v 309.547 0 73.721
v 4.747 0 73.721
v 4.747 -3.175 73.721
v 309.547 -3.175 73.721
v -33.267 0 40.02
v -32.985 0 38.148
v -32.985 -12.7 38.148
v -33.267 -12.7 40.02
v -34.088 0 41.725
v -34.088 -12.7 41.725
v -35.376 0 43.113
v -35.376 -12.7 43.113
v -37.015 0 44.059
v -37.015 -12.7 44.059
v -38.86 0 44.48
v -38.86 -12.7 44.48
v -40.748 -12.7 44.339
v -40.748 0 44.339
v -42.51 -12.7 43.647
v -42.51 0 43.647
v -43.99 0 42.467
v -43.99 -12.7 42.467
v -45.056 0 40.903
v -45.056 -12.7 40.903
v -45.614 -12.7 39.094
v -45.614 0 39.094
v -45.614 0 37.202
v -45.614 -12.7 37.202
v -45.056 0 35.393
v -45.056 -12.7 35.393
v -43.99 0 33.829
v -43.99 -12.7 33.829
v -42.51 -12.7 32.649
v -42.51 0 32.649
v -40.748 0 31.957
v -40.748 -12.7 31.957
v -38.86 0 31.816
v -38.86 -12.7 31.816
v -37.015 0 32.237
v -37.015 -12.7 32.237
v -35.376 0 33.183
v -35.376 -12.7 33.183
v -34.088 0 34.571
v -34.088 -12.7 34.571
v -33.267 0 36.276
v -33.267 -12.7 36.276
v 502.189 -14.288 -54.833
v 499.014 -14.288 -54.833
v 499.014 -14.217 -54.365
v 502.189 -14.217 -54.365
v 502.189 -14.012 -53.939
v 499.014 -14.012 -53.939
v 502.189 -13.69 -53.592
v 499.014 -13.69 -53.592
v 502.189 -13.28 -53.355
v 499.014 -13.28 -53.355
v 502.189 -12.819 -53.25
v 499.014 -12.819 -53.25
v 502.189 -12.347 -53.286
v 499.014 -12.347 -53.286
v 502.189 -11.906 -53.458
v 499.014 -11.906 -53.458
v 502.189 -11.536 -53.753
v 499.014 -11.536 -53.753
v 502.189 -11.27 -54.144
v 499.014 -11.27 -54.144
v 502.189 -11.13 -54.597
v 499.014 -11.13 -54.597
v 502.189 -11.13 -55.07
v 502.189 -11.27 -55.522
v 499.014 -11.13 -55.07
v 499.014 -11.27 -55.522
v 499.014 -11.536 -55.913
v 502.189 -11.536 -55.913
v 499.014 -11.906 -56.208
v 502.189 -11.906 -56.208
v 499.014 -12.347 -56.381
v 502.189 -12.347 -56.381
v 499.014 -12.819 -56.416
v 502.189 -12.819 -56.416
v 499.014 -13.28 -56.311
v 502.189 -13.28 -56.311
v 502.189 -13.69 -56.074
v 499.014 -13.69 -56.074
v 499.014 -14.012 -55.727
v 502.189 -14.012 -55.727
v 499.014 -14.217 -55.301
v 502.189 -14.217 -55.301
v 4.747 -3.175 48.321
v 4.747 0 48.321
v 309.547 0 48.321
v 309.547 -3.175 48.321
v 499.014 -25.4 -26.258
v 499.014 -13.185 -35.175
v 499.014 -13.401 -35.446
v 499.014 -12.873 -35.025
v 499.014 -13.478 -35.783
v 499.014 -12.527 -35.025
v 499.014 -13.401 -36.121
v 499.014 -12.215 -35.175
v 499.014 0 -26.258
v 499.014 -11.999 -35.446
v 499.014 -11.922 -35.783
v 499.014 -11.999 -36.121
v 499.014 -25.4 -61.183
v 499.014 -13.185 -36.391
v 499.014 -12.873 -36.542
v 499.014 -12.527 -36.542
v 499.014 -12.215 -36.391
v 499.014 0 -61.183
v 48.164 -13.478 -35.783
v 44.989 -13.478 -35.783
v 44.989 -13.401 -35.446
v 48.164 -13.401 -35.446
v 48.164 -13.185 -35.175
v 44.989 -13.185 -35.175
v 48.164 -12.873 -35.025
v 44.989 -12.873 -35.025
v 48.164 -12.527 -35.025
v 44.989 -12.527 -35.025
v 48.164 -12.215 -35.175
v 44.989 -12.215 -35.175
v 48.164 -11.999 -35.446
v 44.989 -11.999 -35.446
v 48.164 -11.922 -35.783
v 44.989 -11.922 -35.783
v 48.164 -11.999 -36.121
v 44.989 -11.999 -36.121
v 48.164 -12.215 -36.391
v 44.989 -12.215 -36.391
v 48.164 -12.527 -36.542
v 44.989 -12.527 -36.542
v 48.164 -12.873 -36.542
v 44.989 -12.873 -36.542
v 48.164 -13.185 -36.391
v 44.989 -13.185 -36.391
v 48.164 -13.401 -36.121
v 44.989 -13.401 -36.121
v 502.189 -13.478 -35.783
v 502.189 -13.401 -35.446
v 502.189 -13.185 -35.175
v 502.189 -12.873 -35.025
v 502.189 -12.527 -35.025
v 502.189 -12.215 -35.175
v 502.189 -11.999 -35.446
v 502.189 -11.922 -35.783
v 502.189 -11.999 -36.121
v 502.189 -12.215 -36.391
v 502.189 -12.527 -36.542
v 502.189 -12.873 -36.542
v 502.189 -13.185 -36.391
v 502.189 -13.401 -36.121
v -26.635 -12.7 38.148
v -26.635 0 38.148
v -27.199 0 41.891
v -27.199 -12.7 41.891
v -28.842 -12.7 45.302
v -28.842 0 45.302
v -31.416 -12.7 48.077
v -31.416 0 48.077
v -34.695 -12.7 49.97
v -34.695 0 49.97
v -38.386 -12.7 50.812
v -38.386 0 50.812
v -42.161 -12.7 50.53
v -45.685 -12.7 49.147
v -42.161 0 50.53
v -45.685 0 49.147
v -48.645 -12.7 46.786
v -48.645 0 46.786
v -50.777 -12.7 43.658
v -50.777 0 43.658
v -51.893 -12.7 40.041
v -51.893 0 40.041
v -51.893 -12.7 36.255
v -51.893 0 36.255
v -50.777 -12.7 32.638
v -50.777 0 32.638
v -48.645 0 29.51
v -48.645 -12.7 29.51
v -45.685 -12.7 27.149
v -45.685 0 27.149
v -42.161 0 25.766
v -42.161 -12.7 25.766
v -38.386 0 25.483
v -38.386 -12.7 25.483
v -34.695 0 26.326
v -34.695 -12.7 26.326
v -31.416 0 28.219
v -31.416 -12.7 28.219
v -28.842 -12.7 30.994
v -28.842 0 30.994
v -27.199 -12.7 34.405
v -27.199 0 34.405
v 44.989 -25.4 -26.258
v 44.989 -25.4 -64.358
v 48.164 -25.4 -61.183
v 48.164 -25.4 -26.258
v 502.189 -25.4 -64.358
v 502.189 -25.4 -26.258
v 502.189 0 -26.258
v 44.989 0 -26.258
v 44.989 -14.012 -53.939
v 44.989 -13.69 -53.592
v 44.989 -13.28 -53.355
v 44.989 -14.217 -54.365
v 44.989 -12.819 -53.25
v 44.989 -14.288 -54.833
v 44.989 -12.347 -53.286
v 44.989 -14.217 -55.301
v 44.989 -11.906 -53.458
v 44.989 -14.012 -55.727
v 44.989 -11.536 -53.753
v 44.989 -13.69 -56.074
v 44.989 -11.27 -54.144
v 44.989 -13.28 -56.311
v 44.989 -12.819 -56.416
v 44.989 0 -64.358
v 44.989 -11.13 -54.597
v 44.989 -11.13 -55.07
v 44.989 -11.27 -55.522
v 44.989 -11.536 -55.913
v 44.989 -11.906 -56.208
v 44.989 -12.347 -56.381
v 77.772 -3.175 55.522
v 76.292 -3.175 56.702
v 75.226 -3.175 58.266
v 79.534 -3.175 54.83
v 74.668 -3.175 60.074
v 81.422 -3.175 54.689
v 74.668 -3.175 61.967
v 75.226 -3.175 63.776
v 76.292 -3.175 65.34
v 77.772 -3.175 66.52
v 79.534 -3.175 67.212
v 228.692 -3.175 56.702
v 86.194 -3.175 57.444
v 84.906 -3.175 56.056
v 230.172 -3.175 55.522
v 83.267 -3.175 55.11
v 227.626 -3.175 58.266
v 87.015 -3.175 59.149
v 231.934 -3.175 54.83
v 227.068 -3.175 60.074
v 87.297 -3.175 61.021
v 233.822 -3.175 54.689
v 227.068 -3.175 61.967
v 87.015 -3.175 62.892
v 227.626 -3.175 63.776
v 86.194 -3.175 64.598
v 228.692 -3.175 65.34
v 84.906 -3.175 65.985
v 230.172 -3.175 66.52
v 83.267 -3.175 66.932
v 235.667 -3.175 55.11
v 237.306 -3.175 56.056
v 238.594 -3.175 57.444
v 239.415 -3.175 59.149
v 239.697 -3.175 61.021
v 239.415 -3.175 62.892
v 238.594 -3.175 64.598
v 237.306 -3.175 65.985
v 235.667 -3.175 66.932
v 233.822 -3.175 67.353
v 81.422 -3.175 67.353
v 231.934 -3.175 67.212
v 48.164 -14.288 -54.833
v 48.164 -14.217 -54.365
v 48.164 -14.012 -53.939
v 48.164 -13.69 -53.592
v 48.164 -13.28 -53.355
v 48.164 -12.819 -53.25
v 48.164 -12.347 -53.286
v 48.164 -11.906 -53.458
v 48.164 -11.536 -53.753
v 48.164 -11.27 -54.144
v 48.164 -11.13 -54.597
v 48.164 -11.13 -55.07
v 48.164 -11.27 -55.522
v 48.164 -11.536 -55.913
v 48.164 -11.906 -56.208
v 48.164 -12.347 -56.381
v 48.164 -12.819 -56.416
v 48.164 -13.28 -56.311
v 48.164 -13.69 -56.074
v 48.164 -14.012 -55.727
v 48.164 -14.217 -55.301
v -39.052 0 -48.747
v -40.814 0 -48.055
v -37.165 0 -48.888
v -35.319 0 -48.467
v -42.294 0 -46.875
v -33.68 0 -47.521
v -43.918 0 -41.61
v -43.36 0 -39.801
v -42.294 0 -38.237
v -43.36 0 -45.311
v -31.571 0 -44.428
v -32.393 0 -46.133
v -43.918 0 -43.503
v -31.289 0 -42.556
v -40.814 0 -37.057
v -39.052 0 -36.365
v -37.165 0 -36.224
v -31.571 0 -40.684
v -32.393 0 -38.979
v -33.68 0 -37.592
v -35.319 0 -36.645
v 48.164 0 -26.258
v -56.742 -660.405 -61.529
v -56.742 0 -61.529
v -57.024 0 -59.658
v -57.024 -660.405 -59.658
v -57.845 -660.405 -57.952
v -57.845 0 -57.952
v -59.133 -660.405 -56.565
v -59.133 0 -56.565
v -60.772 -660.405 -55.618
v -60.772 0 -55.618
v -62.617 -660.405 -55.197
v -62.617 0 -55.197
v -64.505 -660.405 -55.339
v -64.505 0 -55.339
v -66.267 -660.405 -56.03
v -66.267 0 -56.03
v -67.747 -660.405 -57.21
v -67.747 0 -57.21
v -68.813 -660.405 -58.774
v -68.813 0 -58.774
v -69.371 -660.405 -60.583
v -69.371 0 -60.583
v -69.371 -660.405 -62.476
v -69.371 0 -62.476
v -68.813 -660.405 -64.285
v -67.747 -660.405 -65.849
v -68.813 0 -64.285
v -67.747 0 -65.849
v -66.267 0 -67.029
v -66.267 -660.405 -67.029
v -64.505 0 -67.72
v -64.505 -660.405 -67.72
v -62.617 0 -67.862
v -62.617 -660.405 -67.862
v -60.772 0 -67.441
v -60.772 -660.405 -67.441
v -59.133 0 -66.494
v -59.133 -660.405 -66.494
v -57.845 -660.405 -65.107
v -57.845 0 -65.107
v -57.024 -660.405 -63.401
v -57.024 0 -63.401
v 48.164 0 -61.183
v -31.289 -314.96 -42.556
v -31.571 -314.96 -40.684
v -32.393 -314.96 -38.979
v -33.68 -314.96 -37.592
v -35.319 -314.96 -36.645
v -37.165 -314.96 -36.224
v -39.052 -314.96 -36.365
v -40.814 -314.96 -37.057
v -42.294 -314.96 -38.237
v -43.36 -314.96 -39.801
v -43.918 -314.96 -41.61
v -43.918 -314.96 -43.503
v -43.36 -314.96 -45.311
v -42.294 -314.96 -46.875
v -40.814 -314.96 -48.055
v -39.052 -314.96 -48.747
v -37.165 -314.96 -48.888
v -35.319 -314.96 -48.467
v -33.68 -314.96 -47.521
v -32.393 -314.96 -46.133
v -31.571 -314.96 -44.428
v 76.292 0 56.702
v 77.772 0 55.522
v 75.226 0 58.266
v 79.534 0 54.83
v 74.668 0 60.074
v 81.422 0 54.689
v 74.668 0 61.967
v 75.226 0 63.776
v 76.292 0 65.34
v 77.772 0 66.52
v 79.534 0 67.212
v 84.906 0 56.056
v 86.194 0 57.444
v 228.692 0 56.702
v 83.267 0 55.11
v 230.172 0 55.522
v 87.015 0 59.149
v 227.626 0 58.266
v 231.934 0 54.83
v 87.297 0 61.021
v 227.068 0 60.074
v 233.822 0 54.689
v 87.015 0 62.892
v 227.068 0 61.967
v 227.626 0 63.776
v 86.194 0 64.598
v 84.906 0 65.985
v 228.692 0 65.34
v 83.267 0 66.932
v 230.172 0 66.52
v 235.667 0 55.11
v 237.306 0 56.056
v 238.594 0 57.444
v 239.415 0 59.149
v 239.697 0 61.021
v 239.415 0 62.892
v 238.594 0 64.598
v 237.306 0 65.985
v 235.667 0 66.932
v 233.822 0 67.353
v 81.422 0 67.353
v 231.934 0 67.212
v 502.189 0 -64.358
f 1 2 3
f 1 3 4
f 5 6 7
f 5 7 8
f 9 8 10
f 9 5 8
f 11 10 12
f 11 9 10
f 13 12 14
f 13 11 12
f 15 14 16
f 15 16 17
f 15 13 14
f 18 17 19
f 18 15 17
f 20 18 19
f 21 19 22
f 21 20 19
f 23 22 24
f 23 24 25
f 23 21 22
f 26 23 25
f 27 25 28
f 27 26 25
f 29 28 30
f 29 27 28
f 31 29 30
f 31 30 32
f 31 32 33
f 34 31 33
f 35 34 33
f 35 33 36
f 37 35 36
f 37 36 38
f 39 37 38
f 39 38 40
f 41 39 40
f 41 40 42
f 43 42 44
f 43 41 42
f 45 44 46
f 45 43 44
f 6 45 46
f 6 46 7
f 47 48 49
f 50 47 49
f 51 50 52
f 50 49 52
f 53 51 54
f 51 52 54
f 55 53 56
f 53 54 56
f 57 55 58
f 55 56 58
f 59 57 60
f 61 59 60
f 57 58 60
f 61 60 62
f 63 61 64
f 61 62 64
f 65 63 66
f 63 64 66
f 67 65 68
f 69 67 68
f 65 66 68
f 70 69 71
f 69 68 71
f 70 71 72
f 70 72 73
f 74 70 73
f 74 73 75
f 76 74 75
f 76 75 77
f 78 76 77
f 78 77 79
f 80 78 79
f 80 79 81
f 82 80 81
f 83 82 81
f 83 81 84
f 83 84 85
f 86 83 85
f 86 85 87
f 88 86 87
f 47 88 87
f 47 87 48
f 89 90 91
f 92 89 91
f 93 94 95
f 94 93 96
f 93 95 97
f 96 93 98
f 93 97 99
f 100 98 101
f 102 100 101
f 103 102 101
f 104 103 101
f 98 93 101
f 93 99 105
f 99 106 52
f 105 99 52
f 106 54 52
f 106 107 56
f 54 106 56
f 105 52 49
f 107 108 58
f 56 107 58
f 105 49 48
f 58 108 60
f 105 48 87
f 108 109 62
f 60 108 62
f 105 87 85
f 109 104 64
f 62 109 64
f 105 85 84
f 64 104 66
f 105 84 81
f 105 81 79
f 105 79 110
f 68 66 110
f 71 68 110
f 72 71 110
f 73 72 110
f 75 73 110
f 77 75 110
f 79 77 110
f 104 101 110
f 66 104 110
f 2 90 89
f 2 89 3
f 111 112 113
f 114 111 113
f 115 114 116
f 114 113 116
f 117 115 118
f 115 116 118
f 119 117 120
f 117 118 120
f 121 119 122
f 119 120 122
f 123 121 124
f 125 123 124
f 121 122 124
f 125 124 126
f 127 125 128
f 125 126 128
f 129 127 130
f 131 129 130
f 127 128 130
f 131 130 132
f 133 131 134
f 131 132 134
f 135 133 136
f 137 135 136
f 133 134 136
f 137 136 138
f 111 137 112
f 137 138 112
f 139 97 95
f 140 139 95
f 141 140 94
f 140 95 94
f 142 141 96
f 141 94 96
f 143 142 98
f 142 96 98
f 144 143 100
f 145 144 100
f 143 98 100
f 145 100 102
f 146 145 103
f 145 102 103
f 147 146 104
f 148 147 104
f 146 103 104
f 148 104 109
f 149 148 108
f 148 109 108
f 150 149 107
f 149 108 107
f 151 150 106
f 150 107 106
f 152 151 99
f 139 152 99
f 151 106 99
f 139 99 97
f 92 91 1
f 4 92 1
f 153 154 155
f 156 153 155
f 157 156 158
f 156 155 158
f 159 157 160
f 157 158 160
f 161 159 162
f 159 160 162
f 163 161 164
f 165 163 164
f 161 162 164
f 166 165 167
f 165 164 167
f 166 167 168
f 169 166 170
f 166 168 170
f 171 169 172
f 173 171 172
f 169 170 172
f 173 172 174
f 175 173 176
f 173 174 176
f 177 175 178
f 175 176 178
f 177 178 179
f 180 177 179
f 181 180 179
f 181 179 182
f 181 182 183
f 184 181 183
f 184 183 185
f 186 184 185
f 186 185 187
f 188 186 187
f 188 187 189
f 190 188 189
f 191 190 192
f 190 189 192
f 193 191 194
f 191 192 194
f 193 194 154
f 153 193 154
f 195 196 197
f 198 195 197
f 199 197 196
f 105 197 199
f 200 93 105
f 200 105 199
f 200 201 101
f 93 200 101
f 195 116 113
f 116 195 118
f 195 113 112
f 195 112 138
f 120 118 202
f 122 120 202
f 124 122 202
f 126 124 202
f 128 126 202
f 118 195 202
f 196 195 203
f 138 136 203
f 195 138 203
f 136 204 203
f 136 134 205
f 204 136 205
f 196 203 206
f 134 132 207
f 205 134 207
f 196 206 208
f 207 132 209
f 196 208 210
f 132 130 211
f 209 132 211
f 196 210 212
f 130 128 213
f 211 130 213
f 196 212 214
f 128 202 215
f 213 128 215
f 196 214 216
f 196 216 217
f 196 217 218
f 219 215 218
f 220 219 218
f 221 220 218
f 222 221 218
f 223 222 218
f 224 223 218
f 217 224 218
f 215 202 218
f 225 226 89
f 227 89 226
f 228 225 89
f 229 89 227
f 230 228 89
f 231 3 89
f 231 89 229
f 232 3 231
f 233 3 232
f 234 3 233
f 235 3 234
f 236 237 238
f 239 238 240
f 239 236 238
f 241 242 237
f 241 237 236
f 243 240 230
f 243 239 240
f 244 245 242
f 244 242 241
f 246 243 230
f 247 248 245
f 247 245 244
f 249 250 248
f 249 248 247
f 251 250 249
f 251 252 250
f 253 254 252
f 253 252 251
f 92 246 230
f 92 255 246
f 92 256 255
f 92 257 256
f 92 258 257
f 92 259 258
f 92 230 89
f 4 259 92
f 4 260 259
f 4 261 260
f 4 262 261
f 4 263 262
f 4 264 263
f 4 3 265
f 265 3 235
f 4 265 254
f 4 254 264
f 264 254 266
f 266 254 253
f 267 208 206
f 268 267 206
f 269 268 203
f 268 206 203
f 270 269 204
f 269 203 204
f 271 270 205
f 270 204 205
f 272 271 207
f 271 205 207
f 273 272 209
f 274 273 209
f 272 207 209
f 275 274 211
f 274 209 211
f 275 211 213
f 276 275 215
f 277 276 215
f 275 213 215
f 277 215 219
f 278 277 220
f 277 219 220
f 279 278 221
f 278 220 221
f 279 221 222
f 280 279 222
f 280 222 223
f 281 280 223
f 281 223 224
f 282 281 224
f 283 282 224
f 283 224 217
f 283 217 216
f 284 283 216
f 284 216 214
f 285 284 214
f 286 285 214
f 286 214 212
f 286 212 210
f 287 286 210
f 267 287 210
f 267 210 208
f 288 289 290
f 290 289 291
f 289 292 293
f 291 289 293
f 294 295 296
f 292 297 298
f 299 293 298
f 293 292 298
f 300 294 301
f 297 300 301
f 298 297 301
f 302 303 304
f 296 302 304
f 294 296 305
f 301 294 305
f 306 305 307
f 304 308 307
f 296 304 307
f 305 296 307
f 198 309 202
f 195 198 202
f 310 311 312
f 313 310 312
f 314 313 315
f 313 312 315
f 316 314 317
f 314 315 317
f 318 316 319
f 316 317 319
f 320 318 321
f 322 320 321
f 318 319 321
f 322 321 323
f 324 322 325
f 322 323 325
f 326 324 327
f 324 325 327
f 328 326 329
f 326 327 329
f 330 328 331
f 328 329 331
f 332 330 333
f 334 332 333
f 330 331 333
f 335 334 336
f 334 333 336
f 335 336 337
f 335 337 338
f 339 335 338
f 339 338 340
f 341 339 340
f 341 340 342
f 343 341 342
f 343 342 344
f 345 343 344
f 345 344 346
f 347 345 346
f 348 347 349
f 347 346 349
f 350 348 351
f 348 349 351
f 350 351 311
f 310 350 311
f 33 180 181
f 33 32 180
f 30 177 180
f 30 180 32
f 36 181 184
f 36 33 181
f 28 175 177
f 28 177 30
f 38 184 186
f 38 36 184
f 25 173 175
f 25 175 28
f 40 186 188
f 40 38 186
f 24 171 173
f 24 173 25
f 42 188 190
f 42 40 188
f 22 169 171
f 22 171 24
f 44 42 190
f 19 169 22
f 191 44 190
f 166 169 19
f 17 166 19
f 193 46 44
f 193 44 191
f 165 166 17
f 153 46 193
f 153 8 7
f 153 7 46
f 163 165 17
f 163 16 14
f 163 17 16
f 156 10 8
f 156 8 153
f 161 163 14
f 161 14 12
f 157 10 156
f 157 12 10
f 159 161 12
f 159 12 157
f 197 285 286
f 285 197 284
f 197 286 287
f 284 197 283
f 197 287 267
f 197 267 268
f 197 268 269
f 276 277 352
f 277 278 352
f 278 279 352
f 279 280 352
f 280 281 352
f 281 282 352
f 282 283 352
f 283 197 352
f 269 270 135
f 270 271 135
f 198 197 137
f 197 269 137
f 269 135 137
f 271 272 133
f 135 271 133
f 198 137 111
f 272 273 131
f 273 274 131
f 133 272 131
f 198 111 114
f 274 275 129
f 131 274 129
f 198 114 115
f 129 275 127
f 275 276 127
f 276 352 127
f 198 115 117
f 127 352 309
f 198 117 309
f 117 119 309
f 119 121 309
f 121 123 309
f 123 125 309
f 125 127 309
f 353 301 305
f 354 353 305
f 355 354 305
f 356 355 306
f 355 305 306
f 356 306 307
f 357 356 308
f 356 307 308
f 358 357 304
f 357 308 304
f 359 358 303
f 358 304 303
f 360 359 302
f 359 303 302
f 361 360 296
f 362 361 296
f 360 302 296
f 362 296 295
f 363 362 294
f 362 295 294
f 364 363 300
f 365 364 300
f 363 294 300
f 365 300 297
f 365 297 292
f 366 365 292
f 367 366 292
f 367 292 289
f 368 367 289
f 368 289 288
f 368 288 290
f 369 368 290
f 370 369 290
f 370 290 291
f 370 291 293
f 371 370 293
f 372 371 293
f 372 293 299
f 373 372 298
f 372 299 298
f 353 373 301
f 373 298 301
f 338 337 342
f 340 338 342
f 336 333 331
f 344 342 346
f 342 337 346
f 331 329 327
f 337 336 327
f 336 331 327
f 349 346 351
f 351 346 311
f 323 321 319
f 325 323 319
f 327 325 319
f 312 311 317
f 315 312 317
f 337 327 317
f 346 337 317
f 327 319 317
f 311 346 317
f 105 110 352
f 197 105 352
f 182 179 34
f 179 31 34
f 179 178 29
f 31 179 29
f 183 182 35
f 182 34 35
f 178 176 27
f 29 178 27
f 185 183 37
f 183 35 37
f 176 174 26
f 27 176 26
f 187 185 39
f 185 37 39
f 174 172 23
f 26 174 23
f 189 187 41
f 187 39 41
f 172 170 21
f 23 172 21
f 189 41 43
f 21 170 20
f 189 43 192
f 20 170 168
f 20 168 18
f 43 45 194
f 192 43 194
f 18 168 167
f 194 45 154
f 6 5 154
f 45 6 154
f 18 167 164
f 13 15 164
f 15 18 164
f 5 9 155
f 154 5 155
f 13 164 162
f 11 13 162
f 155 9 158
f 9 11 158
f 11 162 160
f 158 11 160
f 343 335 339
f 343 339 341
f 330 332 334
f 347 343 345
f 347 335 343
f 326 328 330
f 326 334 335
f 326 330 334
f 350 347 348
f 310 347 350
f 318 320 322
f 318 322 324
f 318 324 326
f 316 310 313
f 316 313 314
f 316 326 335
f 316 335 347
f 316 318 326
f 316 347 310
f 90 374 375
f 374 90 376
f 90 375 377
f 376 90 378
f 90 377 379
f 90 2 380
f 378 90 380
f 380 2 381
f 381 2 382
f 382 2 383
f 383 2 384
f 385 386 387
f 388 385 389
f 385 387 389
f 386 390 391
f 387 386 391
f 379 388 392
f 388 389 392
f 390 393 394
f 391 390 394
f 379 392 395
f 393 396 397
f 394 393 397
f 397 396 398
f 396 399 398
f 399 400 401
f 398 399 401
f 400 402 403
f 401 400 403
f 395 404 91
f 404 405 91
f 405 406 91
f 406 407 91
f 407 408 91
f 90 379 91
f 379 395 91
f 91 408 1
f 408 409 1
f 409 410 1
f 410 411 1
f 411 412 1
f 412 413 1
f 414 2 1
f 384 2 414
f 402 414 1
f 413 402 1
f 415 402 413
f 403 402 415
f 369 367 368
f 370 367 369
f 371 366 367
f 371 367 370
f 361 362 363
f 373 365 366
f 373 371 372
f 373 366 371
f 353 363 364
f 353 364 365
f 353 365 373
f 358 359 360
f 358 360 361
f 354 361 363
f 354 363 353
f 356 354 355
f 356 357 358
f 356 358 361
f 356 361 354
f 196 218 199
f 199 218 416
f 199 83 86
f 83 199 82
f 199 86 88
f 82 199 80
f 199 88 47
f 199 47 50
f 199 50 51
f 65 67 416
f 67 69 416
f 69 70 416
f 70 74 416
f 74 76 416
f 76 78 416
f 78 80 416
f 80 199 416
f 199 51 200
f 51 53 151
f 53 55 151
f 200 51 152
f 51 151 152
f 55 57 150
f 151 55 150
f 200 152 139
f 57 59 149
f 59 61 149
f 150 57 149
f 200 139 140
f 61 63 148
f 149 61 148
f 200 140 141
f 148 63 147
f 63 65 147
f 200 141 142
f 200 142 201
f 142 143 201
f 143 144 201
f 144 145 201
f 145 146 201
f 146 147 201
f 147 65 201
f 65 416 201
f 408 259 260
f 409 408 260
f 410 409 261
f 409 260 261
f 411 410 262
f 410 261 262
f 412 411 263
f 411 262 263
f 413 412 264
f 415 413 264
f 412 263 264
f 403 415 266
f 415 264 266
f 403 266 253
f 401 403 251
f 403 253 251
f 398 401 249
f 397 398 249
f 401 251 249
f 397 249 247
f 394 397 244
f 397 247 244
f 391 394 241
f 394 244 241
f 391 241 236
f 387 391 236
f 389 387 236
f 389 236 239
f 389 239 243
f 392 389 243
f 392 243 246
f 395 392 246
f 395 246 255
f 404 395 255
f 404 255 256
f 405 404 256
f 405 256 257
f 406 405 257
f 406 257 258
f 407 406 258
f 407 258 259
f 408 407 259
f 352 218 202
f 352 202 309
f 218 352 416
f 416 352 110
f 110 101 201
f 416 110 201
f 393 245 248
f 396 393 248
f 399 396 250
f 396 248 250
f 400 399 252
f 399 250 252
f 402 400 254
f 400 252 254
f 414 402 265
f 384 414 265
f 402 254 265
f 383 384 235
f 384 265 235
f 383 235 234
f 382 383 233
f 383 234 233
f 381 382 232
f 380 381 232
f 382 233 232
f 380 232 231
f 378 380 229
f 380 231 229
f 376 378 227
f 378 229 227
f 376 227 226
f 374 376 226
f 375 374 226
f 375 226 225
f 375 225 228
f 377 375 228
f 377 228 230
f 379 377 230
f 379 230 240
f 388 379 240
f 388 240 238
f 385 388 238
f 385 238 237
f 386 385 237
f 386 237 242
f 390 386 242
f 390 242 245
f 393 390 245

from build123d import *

# Parameters (mm, degrees)
F1_DEPTH  = 25.4
F2_R      = 1.5875
F2_R_2    = 0.777875
F3_DEPTH  = 457.201
F0_W      = 304.8
F0_H      = 25.4
F4_DEPTH  = 3.175
F0_R      = 12.7
F0_R_2    = 6.35
F5_DEPTH  = 12.7
F6_DEPTH  = 314.96
F8_R      = 6.35
F9_DEPTH  = 3.176
F10_DEPTH = 660.40508


with BuildPart() as f1:
    # F0 (on Front) → F1 (new body)
    with BuildSketch(Plane.XZ):
        Polygon((48.163591, -26.258205), (44.988591, -26.258205), (44.988591, -64.358205), (502.188591, -64.358205), (502.188591, -26.258205), (499.013591, -26.258205), (499.013591, -61.183205), (48.163591, -61.183205), align=None)
    extrude(amount=F1_DEPTH)

    # F2 (on face) → F3 (cut, through all)
    with BuildSketch(Plane(origin=(44.988591, 0, 0), x_dir=(0, -1, 0), z_dir=(-1, 0, 0))):
        with Locations((12.7, -54.833205)):
            Circle(F2_R)
        with Locations((12.7, -35.783205)):
            Circle(F2_R_2)
    extrude(amount=-F3_DEPTH, mode=Mode.SUBTRACT)


with BuildPart() as f4:
    # F0 (on Front) → F4 (new body)
    with BuildSketch(Plane.XZ):
        with Locations((157.147311, 61.020774)):
            Rectangle(F0_W, F0_H)
    extrude(amount=F4_DEPTH)

    # F8 (on face) → F9 (cut, through all)
    with BuildSketch(Plane.XZ.offset(3.175)):
        with Locations((233.347311, 61.020774)):
            Circle(F8_R)
        with Locations((80.947311, 61.020774)):
            Circle(F8_R)
    extrude(amount=-F9_DEPTH, mode=Mode.SUBTRACT)


with BuildPart() as f5:
    # F0 (on Front) → F5 (new body)
    with BuildSketch(Plane.XZ):
        with Locations((-39.3348, 38.147982)):
            Circle(F0_R)
        with Locations((-39.3348, 38.147982)):
            Circle(F0_R_2, mode=Mode.SUBTRACT)
    extrude(amount=F5_DEPTH)


with BuildPart() as f6:
    # F0 (on Front) → F6 (new body)
    with BuildSketch(Plane.XZ):
        with Locations((-37.639335, -42.556185)):
            Circle(F0_R_2)
    extrude(amount=F6_DEPTH)


with BuildPart() as f10:
    # F0 (on Front) → F10 (new body)
    with BuildSketch(Plane.XZ):
        with Locations((-63.09174, -61.529472)):
            Circle(F0_R_2)
    extrude(amount=F10_DEPTH)


solid = Compound([f1.part, f4.part, f5.part, f6.part, f10.part])
